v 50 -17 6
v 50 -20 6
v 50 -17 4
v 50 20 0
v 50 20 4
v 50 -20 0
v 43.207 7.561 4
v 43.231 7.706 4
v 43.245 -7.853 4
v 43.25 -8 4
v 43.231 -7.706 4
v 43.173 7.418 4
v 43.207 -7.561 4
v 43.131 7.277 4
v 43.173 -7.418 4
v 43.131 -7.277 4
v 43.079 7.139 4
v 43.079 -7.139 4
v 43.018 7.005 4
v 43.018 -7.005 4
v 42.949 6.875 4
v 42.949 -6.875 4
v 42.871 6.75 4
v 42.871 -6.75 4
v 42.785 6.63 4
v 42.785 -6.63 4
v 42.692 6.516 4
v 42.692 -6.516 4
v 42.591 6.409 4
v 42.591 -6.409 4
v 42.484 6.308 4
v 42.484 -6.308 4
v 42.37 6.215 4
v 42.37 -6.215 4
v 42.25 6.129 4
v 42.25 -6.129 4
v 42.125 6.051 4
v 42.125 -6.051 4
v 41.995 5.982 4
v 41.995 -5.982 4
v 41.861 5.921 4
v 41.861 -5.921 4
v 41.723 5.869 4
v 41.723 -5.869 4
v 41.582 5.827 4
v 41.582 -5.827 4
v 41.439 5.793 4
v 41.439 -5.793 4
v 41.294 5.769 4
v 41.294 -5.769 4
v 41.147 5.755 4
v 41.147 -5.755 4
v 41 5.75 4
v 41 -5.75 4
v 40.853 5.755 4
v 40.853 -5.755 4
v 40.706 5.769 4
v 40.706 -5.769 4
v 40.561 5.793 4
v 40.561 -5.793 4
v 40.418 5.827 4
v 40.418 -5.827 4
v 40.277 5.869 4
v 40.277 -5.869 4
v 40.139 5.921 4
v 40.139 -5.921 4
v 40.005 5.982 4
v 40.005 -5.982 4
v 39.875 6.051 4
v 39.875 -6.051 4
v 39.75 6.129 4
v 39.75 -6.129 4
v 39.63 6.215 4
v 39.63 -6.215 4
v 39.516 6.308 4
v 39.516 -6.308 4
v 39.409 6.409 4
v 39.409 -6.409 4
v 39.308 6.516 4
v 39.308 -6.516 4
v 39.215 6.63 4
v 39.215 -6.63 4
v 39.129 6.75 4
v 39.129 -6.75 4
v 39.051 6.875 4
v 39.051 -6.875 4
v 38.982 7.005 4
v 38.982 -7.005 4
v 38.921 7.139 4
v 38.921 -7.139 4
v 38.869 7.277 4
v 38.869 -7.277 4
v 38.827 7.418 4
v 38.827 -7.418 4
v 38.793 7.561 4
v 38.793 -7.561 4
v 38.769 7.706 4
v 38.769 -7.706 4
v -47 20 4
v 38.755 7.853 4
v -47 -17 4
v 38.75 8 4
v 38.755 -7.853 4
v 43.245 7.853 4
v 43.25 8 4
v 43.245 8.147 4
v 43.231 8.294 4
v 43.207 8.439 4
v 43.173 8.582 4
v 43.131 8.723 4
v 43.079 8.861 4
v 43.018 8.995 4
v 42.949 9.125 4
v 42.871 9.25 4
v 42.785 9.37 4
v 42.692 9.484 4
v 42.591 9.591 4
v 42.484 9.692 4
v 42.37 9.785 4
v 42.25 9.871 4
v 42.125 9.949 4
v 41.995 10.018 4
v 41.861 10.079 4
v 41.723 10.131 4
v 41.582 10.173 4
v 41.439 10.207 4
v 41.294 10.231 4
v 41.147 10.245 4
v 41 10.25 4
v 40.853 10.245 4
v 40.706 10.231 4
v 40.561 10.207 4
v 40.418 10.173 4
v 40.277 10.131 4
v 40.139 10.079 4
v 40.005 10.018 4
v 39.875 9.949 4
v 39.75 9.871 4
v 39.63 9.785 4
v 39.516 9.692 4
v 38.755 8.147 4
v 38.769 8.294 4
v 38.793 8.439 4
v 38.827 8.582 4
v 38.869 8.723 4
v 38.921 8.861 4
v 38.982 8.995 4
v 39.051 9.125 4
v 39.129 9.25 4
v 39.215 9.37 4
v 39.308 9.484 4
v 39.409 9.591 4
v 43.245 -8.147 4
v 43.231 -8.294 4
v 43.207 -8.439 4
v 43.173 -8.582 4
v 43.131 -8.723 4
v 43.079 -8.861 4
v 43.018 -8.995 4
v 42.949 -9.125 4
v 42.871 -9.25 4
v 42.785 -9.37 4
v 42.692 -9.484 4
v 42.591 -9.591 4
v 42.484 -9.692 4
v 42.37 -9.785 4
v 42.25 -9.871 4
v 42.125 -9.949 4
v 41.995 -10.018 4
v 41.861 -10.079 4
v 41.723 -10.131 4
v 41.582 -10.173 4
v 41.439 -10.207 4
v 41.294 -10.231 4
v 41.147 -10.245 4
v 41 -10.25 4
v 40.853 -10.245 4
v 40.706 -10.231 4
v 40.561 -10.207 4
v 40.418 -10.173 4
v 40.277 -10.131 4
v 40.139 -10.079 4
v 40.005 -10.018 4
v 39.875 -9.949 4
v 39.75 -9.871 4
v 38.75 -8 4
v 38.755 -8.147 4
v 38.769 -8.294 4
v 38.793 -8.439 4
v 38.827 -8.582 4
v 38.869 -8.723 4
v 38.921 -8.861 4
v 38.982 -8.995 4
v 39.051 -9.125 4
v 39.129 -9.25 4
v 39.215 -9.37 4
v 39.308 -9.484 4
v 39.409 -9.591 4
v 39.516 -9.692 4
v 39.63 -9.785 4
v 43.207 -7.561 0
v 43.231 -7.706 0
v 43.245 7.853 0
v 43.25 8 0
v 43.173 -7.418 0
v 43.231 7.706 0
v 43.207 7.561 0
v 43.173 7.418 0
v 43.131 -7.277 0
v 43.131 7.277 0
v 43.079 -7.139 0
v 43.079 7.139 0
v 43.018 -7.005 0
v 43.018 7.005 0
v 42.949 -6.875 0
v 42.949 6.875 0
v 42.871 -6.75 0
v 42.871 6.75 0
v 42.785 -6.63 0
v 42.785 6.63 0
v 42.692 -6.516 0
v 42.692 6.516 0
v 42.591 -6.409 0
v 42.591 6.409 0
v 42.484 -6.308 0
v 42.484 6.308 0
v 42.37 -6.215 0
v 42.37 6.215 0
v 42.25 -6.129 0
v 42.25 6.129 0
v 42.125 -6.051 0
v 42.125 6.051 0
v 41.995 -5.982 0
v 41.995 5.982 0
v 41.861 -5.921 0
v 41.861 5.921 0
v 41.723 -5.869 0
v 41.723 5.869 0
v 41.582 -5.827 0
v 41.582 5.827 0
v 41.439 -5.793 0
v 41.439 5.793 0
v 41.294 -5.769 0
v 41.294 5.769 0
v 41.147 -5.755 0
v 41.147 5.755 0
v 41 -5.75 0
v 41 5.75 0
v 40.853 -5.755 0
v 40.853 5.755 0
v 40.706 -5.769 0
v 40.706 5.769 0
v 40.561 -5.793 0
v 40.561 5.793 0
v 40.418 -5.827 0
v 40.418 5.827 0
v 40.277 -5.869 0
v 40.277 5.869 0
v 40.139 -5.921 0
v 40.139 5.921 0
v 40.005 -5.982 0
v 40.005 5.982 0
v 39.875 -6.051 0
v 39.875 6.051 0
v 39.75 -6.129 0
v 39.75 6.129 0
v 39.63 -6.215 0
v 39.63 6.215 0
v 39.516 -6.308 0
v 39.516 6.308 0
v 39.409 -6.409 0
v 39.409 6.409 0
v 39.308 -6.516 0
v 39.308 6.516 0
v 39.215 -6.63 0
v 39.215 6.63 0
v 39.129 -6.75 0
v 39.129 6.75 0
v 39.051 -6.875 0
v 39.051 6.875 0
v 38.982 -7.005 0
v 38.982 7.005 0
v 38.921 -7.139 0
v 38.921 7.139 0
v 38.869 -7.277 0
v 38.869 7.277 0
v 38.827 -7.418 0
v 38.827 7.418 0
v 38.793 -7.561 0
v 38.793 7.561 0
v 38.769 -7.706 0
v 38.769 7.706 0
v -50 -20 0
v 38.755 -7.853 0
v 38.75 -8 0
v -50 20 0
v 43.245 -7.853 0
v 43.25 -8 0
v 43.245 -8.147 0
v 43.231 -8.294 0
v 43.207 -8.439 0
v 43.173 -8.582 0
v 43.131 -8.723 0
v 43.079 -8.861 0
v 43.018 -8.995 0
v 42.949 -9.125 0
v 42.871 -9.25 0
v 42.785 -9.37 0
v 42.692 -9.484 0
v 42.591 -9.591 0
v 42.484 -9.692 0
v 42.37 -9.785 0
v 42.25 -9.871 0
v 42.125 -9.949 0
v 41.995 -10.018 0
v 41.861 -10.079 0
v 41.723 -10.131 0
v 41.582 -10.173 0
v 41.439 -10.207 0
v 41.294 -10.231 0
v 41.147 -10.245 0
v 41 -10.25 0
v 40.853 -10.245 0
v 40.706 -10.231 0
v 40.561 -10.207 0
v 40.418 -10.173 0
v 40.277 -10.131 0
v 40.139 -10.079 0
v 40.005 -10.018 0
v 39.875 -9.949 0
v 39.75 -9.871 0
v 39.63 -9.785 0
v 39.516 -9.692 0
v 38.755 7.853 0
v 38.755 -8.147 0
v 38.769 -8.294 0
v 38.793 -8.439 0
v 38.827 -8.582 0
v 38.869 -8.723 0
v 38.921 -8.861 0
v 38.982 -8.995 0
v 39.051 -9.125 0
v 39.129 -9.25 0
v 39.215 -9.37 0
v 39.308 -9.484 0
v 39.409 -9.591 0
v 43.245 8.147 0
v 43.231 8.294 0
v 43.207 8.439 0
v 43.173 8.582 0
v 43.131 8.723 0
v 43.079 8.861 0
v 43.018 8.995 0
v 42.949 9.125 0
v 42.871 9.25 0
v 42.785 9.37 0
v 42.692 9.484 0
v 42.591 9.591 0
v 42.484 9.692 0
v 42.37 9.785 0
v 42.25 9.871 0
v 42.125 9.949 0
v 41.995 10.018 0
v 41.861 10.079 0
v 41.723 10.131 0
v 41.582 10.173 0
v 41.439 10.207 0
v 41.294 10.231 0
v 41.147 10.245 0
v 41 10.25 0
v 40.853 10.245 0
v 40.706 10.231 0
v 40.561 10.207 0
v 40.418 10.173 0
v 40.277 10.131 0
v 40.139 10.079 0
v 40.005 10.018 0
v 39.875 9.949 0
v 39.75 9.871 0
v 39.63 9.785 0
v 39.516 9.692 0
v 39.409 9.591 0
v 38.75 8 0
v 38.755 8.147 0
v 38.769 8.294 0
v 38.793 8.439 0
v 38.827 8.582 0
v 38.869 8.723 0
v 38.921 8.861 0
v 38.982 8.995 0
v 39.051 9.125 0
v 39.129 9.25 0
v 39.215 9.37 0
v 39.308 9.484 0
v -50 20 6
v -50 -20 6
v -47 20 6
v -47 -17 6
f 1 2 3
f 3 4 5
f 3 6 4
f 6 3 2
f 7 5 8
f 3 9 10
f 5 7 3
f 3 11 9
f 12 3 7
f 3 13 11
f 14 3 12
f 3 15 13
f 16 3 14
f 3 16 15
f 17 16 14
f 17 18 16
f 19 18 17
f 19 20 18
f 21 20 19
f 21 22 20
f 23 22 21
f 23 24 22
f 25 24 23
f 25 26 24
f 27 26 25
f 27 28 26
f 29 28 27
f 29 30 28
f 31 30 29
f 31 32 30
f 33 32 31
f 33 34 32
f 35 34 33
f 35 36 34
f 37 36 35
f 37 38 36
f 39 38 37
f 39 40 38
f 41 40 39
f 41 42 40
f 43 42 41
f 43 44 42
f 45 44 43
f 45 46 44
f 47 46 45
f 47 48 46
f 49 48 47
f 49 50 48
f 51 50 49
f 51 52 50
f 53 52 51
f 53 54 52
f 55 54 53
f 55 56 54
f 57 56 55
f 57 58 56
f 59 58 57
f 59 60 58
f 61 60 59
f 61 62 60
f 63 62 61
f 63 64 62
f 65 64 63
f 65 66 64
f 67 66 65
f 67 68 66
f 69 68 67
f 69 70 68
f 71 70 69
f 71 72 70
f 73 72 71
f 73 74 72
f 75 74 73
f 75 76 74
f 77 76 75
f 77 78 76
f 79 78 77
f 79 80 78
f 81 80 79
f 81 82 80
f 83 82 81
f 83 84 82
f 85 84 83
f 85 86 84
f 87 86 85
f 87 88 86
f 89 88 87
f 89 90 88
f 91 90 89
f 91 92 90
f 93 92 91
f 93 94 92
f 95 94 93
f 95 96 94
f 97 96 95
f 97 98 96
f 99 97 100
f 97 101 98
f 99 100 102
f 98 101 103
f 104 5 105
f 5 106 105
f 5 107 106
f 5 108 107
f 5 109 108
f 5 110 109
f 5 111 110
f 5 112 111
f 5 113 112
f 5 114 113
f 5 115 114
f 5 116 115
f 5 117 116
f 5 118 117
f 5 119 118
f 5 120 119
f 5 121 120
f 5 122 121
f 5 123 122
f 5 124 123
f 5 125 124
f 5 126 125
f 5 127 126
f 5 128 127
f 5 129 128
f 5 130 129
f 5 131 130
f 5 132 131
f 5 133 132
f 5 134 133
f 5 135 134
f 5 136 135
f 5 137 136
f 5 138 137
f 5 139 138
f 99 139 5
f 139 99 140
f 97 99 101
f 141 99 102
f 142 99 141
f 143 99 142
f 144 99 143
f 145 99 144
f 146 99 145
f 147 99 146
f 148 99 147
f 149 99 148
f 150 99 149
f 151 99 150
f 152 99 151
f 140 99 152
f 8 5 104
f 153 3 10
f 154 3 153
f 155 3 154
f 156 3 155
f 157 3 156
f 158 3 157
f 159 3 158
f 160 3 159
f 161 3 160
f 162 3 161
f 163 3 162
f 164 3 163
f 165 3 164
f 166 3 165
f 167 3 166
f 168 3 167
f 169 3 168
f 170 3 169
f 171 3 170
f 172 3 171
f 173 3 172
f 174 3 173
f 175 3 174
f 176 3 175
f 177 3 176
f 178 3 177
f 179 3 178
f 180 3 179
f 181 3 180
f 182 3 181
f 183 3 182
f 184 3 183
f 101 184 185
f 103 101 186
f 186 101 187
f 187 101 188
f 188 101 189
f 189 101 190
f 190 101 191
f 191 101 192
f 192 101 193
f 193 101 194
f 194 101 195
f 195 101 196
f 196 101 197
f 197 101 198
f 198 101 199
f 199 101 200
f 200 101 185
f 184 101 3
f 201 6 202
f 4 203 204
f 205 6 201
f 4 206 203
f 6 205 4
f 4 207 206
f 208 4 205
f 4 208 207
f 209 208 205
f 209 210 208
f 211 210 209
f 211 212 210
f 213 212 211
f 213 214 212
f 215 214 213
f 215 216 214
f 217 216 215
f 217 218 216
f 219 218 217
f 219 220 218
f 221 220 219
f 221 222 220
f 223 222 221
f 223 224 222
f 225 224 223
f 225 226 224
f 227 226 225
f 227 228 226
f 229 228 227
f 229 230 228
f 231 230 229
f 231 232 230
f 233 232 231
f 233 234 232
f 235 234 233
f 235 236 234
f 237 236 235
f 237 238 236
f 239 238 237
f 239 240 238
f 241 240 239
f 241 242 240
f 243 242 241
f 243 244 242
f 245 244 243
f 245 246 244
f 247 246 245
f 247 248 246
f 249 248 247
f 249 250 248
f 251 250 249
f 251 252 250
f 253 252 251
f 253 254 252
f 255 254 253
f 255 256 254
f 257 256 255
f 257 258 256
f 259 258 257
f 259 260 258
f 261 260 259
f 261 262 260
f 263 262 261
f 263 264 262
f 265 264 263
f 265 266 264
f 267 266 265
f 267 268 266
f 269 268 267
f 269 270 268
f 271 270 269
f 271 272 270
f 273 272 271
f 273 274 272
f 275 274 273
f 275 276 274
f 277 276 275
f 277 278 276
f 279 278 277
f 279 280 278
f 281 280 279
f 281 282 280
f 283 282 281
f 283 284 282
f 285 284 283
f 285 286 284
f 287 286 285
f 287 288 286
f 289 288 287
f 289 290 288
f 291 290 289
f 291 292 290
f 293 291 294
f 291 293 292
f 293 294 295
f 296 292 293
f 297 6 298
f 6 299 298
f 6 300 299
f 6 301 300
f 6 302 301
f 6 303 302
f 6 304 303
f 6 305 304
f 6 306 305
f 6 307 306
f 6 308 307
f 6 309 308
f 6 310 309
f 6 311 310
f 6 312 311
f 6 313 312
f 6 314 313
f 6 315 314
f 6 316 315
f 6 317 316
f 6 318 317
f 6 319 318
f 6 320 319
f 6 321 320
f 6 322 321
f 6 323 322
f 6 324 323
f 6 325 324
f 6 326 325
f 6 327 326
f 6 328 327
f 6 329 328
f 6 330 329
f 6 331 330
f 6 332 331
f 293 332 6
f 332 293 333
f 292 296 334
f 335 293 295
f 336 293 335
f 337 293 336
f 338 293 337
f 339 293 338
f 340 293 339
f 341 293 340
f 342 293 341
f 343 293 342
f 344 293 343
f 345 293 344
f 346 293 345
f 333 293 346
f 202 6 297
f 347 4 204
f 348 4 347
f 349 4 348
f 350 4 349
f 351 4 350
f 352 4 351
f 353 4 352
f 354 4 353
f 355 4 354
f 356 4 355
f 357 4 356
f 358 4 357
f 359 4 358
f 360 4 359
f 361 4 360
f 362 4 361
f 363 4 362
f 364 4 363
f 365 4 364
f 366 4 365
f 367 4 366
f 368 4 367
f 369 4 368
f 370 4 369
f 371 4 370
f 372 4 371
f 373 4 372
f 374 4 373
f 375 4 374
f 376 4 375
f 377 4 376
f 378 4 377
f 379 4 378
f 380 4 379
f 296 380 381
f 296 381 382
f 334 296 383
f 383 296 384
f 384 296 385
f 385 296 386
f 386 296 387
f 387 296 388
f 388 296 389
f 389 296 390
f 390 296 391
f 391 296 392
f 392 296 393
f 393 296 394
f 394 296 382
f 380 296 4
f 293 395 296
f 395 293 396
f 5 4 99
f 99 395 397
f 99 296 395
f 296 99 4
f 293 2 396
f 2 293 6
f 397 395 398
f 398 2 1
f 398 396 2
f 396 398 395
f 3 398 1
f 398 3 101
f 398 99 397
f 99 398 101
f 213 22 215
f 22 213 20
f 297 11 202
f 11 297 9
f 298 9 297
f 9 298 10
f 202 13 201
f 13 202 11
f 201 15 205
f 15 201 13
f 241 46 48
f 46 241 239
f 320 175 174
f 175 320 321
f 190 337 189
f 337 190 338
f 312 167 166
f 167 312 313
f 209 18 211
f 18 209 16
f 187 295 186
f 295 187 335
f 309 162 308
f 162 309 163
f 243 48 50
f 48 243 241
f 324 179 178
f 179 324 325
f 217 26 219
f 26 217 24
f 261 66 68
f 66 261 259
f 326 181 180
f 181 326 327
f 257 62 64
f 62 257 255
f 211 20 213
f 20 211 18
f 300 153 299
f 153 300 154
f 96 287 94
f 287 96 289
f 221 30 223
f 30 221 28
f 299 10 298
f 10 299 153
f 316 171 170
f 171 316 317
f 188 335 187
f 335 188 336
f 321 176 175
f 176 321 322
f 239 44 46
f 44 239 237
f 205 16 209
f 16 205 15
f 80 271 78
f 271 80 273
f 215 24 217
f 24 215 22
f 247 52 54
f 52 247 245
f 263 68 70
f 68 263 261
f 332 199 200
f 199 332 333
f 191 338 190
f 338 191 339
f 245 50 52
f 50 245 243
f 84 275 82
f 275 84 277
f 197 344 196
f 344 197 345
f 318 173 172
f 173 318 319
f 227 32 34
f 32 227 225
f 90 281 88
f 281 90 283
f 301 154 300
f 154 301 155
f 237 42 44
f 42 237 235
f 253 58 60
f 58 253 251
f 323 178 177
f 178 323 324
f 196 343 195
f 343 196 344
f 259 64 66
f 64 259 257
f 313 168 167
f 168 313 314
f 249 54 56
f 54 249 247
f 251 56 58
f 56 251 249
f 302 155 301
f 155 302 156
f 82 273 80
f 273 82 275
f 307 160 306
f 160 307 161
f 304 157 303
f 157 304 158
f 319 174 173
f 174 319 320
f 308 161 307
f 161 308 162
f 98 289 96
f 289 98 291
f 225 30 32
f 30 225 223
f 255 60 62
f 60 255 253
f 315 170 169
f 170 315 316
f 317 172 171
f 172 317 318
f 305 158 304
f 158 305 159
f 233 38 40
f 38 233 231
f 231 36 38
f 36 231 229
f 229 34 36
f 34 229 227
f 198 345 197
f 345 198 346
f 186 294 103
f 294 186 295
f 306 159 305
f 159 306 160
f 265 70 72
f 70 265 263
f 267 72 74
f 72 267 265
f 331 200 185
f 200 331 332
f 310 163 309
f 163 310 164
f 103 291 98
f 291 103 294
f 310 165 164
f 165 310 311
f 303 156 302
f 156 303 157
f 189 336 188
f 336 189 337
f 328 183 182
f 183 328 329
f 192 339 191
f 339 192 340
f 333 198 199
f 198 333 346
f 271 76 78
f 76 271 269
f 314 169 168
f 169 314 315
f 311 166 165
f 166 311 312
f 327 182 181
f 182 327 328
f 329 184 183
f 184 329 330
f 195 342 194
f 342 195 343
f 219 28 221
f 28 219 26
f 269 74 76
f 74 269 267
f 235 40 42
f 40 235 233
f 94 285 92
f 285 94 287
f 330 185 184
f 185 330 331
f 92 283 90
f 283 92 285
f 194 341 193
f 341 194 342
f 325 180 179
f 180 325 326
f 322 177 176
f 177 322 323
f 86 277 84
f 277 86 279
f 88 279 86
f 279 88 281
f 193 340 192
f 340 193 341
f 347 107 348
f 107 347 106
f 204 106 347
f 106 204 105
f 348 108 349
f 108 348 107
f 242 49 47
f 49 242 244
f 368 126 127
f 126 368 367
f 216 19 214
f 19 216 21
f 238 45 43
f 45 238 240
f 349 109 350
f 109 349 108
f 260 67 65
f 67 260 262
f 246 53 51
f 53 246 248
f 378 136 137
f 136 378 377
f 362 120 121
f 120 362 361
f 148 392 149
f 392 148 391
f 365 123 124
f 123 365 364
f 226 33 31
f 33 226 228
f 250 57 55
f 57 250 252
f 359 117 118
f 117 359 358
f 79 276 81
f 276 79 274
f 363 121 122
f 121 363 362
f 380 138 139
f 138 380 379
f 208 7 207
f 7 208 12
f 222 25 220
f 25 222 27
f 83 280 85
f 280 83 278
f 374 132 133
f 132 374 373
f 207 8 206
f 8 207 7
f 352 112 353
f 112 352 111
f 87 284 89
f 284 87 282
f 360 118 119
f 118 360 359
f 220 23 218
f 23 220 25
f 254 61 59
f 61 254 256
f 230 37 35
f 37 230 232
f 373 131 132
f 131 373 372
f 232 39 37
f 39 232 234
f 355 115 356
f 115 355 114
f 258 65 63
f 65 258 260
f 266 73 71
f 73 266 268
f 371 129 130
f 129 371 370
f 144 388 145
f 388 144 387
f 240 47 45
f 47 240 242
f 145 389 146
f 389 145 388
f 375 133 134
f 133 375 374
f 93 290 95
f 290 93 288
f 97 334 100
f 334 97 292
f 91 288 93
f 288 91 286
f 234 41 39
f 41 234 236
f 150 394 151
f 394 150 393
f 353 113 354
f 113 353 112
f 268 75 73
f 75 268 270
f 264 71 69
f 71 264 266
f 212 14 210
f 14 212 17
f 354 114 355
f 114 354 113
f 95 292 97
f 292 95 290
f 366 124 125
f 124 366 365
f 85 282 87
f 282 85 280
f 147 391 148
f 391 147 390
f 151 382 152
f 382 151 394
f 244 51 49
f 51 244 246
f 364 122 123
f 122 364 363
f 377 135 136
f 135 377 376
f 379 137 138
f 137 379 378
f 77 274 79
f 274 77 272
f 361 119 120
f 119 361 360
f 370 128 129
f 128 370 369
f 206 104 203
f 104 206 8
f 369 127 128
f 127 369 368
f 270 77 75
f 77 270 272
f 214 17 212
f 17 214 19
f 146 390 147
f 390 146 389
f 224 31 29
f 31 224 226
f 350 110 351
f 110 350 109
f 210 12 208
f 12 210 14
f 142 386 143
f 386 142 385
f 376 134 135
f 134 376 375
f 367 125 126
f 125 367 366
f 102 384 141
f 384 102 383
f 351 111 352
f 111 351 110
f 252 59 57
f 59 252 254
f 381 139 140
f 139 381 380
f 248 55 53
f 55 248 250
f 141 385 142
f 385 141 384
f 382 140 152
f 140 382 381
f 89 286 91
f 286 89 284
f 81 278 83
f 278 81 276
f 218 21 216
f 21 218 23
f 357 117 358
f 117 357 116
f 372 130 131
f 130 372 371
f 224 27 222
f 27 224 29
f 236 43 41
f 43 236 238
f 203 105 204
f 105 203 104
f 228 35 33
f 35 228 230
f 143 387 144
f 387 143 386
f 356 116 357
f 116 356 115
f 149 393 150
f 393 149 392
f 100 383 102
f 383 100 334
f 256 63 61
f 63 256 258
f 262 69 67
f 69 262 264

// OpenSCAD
// Microscope-slide registration jig with two clamp holes
// Category: benchware; Purpose: repeatable origin when photographing a 75 x 25 mm microscope slide.
// Print: FDM, on the broad bottom face at z=0; no support required.
// This is a geometric reference design; no dimensional fit or lab use has been physically validated.
// SPDX-License-Identifier: CERN-OHL-P-2.0

/* [Platform] */
// Overall platform length, X (mm)
base_l = 100; // 0.5
// Overall platform width, Y (mm)
base_w = 40; // 0.5
// Platform thickness (mm)
base_h = 4; // 0.5

/* [Registration Edges] */
// Width of each perpendicular registration rail (mm)
rail_w = 3; // 0.1
// Height of rails above print bed (mm)
rail_top = 6; // 0.5

/* [Fasteners] */
// Diameter of each right-side mounting hole (mm)
bore_d = 4.5; // 0.1
// X coordinate of the mounting-hole centers (mm)
bore_x = 41; // 0.5
// Absolute Y coordinate of mounting-hole centers (mm)
bore_y = 8; // 0.5

/* [Hidden] */
$fn = 96;
eps = 0.1;
assert(base_l >= 90 && base_w >= 35);
assert(rail_w >= 1.6 && rail_top >= base_h + 2);
assert(bore_d > 0 && bore_d < 8);
assert(bore_x + bore_d/2 < base_l/2 - 1);
assert(bore_x - bore_d/2 > -base_l/2 + rail_w + 1);
assert(bore_y + bore_d/2 < base_w/2 - 1);
assert(bore_y - bore_d/2 > -base_w/2 + rail_w + 1);
assert(bore_d / 2 + 2 < bore_y);

difference() {
    union() {
        translate([-base_l/2, -base_w/2, 0])
            cube([base_l, base_w, base_h]);
        translate([-base_l/2, -base_w/2, base_h])
            cube([base_l, rail_w, rail_top-base_h]);
        translate([-base_l/2, -base_w/2, base_h])
            cube([rail_w, base_w, rail_top-base_h]);
    }
    for (sign=[-1,1])
        translate([bore_x, sign*bore_y, -eps])
            cylinder(h=base_h+2*eps, d=bore_d);
}
